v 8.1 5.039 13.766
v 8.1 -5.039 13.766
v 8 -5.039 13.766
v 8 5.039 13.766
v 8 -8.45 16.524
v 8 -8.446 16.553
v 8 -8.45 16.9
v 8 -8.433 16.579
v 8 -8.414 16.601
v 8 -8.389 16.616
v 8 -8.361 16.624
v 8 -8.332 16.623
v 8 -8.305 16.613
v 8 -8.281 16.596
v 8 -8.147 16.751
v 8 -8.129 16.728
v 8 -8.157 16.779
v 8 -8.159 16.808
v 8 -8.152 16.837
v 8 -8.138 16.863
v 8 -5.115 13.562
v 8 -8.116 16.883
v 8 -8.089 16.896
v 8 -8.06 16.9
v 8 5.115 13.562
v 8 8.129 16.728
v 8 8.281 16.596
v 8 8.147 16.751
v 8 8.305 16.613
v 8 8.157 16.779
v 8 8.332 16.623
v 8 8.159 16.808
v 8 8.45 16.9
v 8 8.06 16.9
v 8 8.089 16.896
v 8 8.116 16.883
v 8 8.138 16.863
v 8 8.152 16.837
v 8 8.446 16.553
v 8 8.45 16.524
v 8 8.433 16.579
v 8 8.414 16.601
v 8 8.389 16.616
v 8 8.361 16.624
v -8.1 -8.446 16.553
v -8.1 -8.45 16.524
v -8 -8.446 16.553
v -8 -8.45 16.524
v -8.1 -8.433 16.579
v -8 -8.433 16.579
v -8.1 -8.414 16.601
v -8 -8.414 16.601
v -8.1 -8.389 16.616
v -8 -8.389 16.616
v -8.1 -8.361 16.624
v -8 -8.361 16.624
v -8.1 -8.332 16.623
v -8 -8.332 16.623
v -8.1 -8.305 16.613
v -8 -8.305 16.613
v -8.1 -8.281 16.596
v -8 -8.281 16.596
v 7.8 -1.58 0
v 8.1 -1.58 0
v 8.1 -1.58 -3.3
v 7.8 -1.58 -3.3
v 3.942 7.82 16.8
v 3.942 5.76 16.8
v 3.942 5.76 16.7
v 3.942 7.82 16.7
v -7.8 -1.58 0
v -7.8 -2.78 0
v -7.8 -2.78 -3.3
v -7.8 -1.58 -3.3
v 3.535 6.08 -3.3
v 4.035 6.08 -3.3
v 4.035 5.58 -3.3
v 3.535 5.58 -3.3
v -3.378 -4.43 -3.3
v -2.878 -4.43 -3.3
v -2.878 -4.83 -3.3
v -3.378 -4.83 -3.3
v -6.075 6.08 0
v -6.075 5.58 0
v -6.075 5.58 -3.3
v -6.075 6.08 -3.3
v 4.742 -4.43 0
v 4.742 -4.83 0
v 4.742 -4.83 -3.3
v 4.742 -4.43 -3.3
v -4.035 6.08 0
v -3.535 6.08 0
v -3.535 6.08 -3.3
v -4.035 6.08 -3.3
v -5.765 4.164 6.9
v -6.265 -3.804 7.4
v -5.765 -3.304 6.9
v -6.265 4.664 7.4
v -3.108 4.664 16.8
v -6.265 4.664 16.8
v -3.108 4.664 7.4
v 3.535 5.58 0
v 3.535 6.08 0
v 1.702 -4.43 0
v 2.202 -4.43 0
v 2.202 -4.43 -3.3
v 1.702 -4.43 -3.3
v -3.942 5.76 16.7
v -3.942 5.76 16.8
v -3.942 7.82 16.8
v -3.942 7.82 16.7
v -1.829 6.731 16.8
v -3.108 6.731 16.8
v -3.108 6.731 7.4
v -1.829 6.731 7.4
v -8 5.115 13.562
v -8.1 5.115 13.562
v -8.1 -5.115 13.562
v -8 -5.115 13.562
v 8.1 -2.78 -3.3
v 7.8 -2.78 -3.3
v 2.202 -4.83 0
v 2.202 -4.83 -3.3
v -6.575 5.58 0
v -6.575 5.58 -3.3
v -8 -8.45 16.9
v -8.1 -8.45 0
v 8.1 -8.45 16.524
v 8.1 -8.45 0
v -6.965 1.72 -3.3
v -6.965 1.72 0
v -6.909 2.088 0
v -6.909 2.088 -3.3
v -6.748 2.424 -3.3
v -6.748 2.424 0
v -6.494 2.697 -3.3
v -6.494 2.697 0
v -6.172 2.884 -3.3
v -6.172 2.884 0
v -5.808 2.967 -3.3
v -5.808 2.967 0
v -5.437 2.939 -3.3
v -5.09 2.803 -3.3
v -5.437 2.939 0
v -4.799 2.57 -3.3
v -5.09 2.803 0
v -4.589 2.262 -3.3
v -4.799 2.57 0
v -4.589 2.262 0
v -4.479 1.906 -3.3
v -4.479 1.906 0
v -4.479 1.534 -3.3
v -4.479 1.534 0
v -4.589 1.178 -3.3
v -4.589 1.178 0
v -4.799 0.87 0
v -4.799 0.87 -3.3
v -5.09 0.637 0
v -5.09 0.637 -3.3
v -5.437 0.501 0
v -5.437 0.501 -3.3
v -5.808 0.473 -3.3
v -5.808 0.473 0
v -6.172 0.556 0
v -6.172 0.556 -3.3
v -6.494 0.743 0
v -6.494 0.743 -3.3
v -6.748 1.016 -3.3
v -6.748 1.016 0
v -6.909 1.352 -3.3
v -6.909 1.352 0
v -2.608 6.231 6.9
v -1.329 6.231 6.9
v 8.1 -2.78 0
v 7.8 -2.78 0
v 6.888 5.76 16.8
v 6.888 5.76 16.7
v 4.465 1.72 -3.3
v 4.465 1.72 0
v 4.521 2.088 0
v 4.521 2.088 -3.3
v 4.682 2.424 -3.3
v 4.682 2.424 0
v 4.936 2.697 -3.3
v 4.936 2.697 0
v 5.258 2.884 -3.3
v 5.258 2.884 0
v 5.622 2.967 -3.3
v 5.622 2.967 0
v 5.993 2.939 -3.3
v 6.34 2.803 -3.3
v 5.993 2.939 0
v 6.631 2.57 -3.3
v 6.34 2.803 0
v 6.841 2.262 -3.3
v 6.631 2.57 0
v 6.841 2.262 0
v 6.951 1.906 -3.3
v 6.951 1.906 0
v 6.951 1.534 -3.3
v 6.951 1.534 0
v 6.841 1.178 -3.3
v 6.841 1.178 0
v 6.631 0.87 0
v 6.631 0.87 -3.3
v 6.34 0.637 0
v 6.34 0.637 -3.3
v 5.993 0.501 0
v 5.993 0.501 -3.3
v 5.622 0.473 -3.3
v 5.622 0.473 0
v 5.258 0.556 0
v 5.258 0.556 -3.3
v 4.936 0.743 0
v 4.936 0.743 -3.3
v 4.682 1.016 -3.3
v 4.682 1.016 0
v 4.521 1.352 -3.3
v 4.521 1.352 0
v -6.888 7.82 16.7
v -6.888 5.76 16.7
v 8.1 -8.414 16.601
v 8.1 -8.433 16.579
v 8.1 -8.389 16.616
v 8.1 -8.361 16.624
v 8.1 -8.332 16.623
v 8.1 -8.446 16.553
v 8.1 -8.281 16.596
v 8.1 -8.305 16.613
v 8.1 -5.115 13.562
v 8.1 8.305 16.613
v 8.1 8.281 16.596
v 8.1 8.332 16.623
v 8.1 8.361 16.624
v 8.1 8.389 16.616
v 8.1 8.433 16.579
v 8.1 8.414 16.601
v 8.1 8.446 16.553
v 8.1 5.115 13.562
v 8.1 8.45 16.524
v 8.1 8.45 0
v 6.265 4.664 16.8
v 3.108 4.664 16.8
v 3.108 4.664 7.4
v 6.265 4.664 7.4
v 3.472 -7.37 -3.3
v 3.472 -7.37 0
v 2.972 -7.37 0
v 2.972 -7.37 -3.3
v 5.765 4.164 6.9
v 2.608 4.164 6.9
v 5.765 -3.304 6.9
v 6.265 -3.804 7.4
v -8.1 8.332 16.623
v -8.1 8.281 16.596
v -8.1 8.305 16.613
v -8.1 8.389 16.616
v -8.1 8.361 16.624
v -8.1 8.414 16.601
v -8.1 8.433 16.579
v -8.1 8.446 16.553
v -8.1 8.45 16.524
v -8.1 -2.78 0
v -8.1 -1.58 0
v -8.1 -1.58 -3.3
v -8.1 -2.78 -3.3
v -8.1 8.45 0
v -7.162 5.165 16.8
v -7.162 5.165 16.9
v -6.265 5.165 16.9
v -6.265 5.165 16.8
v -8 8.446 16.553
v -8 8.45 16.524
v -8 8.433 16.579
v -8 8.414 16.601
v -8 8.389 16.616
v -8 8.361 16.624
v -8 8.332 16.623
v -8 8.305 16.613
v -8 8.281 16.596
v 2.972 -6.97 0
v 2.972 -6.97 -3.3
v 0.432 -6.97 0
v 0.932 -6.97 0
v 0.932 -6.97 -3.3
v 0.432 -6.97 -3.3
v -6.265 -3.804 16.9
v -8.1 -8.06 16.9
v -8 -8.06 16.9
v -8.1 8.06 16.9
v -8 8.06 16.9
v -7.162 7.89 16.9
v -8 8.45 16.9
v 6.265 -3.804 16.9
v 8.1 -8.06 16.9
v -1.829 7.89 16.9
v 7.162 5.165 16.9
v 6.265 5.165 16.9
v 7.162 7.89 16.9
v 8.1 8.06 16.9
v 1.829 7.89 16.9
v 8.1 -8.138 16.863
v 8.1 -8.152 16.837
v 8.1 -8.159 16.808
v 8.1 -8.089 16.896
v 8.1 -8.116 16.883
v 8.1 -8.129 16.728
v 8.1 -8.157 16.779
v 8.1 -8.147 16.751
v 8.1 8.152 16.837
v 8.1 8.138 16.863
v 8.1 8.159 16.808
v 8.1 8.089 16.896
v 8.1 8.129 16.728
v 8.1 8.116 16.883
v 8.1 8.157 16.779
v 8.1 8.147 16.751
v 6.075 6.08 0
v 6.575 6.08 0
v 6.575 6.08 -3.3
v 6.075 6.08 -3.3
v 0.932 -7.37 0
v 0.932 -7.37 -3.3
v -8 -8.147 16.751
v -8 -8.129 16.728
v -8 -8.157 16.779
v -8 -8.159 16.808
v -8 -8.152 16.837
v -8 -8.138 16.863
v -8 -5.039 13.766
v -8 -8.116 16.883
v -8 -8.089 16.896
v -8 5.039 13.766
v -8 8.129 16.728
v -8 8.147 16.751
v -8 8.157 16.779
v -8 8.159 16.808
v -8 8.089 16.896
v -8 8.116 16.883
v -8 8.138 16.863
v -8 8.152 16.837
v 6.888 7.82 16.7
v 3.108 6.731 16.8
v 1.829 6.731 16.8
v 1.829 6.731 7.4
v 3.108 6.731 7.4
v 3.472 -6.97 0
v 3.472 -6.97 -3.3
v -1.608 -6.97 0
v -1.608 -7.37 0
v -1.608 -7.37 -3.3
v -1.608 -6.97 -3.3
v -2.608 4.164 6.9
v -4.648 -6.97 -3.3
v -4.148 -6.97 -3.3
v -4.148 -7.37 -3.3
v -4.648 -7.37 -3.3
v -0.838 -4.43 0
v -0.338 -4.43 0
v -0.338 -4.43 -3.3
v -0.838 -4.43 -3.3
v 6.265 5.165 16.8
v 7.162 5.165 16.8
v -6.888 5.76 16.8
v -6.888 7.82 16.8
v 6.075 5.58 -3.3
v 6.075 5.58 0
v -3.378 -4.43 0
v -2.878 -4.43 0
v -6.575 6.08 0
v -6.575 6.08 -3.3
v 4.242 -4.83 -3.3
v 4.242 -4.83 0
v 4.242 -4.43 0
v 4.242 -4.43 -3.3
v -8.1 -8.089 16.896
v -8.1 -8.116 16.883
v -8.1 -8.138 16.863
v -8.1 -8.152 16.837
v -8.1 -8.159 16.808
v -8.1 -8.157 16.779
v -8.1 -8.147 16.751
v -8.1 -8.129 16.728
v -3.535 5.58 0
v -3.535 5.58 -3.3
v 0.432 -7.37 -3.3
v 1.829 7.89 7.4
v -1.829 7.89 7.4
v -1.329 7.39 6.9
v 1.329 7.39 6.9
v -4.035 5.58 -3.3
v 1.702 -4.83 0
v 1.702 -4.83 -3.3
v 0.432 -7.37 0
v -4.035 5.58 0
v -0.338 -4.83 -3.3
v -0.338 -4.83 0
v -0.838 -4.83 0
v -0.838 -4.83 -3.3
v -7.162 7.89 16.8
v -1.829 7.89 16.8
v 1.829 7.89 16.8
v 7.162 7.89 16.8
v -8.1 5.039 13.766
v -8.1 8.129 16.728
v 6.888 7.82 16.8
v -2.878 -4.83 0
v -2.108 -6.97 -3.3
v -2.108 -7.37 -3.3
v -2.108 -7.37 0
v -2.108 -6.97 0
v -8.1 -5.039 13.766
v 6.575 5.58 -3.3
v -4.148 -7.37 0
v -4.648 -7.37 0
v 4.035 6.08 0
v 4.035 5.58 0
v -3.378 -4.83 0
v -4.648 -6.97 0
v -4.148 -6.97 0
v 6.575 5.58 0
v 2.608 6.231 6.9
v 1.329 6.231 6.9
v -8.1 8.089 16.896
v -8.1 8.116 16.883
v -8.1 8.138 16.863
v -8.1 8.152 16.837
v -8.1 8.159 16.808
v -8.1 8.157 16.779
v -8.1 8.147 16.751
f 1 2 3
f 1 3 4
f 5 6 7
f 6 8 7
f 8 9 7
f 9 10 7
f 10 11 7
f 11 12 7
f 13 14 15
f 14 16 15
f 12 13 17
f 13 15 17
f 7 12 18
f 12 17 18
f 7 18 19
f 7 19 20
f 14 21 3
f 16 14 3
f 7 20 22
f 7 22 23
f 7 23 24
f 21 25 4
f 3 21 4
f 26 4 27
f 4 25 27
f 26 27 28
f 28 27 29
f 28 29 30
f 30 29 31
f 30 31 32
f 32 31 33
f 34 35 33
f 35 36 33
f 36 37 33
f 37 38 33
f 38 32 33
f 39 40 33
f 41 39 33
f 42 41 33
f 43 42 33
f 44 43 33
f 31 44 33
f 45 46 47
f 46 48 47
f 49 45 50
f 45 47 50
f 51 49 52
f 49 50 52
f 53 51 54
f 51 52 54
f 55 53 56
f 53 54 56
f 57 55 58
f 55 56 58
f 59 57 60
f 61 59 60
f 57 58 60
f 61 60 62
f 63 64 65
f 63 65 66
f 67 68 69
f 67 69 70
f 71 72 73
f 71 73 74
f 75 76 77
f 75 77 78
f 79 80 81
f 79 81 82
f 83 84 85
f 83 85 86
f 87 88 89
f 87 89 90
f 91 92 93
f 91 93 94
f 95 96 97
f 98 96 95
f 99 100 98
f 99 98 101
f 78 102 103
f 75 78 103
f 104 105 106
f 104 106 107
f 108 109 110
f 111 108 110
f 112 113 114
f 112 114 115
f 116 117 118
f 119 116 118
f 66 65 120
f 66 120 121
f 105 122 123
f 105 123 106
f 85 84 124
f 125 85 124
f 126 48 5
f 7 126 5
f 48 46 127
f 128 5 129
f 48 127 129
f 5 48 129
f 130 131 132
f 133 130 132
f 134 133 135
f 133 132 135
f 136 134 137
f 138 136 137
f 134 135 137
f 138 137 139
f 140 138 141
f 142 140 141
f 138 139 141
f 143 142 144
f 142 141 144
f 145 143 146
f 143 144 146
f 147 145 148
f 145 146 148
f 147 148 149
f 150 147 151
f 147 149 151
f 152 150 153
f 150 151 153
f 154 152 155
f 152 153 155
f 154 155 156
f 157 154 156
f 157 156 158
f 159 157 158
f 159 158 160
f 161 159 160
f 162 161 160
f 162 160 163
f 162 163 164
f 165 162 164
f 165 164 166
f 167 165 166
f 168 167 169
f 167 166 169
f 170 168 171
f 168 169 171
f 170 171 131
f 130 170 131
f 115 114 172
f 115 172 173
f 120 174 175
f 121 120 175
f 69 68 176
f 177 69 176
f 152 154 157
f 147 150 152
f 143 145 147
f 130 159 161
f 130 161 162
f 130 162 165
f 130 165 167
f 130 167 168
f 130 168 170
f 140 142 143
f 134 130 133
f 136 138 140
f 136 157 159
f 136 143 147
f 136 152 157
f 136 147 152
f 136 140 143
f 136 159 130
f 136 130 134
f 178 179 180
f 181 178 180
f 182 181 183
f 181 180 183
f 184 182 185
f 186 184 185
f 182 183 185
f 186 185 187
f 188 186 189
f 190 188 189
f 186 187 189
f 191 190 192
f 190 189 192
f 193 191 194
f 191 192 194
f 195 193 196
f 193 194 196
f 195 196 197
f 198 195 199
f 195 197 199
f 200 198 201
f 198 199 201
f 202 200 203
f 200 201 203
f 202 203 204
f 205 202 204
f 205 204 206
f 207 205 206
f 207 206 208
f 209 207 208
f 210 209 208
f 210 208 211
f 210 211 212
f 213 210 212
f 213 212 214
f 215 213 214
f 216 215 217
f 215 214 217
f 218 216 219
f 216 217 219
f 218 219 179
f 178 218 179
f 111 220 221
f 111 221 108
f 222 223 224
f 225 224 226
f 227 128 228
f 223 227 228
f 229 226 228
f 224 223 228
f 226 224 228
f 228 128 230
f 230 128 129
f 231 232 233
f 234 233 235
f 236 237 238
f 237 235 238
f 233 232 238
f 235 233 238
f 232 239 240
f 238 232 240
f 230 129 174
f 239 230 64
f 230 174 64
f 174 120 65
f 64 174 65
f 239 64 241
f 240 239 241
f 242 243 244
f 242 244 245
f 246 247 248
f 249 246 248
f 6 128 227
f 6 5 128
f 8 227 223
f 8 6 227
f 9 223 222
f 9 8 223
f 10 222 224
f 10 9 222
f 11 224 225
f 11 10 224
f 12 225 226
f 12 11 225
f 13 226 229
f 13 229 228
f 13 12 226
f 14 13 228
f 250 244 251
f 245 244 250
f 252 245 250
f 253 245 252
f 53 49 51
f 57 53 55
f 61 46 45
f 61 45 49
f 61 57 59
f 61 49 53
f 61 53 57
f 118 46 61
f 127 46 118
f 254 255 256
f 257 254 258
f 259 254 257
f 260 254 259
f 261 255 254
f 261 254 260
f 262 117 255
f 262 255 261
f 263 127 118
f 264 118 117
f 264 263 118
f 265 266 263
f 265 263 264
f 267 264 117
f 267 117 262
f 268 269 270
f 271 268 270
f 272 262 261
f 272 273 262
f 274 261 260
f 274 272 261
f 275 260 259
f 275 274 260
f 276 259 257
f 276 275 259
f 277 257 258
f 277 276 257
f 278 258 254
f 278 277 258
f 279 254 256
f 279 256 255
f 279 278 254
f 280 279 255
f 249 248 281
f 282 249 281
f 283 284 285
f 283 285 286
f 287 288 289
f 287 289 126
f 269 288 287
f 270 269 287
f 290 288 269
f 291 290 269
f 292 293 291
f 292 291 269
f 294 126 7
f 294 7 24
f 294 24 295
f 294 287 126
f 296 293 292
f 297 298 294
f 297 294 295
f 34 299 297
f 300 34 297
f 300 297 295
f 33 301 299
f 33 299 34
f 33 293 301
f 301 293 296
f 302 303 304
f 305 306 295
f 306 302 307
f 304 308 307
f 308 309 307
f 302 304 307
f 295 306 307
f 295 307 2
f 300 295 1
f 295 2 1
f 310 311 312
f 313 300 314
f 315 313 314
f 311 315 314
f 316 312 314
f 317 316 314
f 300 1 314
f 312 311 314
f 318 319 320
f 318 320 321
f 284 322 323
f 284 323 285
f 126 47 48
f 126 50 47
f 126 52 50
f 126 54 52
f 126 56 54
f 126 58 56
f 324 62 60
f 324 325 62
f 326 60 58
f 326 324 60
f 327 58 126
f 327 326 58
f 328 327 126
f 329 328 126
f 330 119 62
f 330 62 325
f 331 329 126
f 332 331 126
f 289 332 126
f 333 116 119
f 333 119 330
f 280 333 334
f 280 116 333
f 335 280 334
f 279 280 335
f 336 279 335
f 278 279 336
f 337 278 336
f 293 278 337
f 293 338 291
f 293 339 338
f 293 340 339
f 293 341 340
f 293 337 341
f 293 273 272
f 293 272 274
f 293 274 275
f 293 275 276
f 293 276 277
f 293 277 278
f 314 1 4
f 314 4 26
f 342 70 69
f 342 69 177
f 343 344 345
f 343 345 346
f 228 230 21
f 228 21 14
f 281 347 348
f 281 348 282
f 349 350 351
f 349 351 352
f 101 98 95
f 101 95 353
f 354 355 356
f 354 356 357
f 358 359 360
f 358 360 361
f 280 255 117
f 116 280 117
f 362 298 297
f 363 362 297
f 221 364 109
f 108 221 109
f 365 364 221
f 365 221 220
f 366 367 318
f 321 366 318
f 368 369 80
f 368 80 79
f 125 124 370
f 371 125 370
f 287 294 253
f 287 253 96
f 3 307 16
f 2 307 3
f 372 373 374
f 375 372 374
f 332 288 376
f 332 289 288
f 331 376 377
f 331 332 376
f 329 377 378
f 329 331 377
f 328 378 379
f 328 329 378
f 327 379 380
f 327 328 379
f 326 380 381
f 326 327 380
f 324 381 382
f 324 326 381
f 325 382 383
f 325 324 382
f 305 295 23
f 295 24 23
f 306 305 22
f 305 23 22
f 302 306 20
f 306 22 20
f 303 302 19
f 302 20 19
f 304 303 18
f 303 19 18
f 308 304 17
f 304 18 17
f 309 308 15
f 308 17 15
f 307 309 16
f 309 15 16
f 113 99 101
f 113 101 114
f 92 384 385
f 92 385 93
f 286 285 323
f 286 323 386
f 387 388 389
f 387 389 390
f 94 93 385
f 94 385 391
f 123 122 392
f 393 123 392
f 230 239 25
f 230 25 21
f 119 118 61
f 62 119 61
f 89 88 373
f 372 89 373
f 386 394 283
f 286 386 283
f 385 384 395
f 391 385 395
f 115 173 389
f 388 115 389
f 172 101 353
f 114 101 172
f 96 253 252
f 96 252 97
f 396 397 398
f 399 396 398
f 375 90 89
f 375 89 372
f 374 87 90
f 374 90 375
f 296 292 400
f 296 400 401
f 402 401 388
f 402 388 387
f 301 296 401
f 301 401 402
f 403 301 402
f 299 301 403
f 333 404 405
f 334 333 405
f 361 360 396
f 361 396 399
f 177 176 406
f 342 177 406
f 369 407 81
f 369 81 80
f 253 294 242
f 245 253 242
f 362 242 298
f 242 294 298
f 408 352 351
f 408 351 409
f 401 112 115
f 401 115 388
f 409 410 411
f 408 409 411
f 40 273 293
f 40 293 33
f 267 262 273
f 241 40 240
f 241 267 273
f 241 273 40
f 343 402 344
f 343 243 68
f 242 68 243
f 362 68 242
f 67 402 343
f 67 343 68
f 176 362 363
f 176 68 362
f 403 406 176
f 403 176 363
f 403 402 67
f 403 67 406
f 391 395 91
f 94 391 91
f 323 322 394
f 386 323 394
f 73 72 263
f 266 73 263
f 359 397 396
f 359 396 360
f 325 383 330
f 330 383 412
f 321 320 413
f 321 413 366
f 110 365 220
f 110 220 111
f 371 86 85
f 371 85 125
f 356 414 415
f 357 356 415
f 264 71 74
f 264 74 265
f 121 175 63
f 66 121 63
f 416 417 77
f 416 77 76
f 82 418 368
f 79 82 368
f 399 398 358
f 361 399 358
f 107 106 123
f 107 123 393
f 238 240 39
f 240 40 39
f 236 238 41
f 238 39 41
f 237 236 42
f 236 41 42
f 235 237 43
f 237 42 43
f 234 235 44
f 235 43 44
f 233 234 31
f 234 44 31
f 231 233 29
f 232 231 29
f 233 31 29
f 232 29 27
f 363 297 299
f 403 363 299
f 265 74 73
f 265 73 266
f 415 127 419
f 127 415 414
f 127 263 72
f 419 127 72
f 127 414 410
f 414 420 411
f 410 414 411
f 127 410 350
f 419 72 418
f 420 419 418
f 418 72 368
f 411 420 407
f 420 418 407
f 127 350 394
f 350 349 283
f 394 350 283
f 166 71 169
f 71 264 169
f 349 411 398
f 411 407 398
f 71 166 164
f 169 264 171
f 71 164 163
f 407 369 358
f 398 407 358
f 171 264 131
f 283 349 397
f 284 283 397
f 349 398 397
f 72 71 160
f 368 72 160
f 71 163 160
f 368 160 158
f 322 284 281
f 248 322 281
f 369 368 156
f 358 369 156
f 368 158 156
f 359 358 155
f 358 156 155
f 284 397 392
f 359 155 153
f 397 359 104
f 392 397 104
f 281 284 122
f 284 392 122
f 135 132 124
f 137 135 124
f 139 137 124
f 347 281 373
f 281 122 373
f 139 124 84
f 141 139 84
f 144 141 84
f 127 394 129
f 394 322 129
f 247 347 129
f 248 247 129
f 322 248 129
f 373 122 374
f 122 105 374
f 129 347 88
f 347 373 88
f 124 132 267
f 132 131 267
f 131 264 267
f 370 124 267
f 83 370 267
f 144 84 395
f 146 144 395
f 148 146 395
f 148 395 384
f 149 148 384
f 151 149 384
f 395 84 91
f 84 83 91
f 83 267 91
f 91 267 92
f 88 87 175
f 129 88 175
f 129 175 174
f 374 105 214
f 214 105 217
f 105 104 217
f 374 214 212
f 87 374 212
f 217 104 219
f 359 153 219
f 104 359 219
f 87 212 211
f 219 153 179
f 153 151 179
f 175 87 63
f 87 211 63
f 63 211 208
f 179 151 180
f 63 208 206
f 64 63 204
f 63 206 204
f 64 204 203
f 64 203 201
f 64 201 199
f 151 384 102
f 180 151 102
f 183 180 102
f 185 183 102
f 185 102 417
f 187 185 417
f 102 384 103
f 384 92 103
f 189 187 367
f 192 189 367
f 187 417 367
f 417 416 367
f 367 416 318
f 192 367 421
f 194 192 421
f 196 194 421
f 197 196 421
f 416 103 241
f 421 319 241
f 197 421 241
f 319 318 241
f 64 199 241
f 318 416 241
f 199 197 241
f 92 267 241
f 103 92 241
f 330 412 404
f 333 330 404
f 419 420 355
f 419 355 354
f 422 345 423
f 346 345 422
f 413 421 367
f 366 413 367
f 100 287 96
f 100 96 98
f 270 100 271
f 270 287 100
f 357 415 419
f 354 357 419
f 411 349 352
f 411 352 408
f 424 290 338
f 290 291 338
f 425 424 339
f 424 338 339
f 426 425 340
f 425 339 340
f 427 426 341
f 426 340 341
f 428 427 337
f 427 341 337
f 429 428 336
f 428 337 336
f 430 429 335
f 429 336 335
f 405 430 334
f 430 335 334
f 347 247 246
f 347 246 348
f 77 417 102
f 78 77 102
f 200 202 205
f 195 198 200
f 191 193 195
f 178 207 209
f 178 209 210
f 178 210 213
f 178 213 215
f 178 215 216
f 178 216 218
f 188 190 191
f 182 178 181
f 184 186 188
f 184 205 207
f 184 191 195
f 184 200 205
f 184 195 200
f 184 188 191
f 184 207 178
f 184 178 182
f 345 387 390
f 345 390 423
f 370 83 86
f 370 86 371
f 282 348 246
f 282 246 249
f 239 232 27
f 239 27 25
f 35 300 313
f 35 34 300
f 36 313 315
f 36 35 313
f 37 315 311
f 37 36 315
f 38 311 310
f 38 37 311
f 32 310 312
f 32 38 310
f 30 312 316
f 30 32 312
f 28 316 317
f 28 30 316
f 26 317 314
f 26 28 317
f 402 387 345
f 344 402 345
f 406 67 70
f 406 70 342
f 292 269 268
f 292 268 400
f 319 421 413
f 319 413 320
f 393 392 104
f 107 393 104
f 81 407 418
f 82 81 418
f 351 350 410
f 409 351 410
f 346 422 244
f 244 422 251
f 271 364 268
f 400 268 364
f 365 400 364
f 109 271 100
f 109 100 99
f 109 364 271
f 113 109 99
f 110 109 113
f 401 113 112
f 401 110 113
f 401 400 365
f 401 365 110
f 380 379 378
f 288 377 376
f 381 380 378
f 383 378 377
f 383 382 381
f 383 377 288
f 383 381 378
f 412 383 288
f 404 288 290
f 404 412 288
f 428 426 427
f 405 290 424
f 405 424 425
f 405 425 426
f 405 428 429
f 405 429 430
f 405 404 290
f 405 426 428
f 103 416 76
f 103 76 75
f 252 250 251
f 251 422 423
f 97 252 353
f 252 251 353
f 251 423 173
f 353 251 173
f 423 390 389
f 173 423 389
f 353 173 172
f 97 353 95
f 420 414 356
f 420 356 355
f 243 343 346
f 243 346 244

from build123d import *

# Parameters (mm, degrees)
SKETCH_1_W          = 16.2
SKETCH_1_H          = 16.9
EXTRUDE_1_DEPTH     = 16.9
CUT_EXTRUDE_1_DEPTH = 10
SKETCH_3_W          = 2.946300562
SKETCH_3_H          = 2.060350043
CUT_EXTRUDE_2_DEPTH = 0.2
SKETCH_4_W          = 14.323300114
SKETCH_4_H          = 2.725353119
CUT_EXTRUDE_3_DEPTH = 0.1
SKETCH_5_W          = 12.529891582
SKETCH_5_H          = 0.500524342
CUT_EXTRUDE_4_DEPTH = 0.1
CHAMFER_1_SIZE      = 0.5
CUT_EXTRUDE_5_DEPTH = 0.1
FILLET_1_R          = 0.1
SKETCH_7_R          = 1.25
SKETCH_7_W          = 0.5
SKETCH_7_H          = 0.4
SKETCH_7_H_2        = 0.5
SKETCH_7_W_2        = 0.3
SKETCH_7_H_3        = 1.2
EXTRUDE_2_DEPTH     = 3.3


with BuildPart() as part:
    # Эскиз1 → Бобышка-Вытянуть1 (new body)
    with BuildSketch(Plane.XY):
        Rectangle(SKETCH_1_W, SKETCH_1_H)
    extrude(amount=EXTRUDE_1_DEPTH)

    # Эскиз2 → Вырез-Вытянуть1 (cut)
    with BuildSketch(Plane.XY.offset(16.9)):
        Polygon((-6.264945791, -3.803921673), (-6.264945791, 4.664369649), (-3.10783524, 4.664369649), (-3.10783524, 6.730894781), (-1.828998264, 6.730894781), (-1.828998264, 7.89024711), (1.828998264, 7.89024711), (1.828998264, 6.730894781), (3.10783524, 6.730894781), (3.10783524, 4.664369649), (6.264945791, 4.664369649), (6.264945791, -3.803921673), align=None)
    extrude(amount=-CUT_EXTRUDE_1_DEPTH, mode=Mode.SUBTRACT)

    # Эскиз3 → Вырез-Вытянуть2 (cut)
    with BuildSketch(Plane.XY.offset(16.9)):
        with Locations((-5.415203287, 6.790232272)):
            Rectangle(SKETCH_3_W, SKETCH_3_H)
        with Locations((5.415203287, 6.790232272)):
            Rectangle(SKETCH_3_W, SKETCH_3_H)
    extrude(amount=-CUT_EXTRUDE_2_DEPTH, mode=Mode.SUBTRACT)

    # Эскиз4 → Вырез-Вытянуть3 (cut)
    with BuildSketch(Plane.XY.offset(16.9)):
        with Locations((0, 6.527570551)):
            Rectangle(SKETCH_4_W, SKETCH_4_H)
    extrude(amount=-CUT_EXTRUDE_3_DEPTH, mode=Mode.SUBTRACT)

    # Эскиз5 → Вырез-Вытянуть4 (cut)
    with BuildSketch(Plane.XY.offset(16.9)):
        with Locations((0, 4.91463182)):
            Rectangle(SKETCH_5_W, SKETCH_5_H)
    extrude(amount=-CUT_EXTRUDE_4_DEPTH, mode=Mode.SUBTRACT)

    # Фаска1
    chamfer_1_edges = [part.edges().sort_by_distance(p)[0] for p in [
        (0, -3.803921673, 6.9),
        (-6.264945791, 0.430223988, 6.9),
        (-4.686390516, 4.664369649, 6.9),
        (-3.10783524, 5.697632215, 6.9),
        (-2.468416752, 6.730894781, 6.9),
        (-1.828998264, 7.310570945, 6.9),
        (0, 7.89024711, 6.9),
        (1.828998264, 7.310570945, 6.9),
        (2.468416752, 6.730894781, 6.9),
        (3.10783524, 5.697632215, 6.9),
        (4.686390516, 4.664369649, 6.9),
        (6.264945791, 0.430223988, 6.9),
    ]]
    chamfer(chamfer_1_edges, length=CHAMFER_1_SIZE)

    # Эскиз6 → Вырез-Вытянуть5 (cut)
    with BuildSketch(Plane.ZY.offset(8.1)):
        Polygon((16.758546947, 8.45), (13.561955432, 5.115115471), (13.561955432, -5.115115471), (16.758546947, -8.45), (16.9, -8.45), (16.9, -8.308546947), (13.766132229, -5.039099757), (13.766132229, 5.039099757), (16.9, 8.308546947), (16.9, 8.45), align=None)
    cut_extrude_5 = extrude(amount=-CUT_EXTRUDE_5_DEPTH, mode=Mode.SUBTRACT)

    # Зеркальное отражение1: Вырез-Вытянуть5 across plane
    add(cut_extrude_5.mirror(Plane(origin=(0, 0, 0), x_dir=(0, 0, 1), z_dir=(1, 0, 0))), mode=Mode.SUBTRACT)

    # Скругление1
    fillet_1_edges = [part.edges().sort_by_distance(p)[0] for p in [
        (-8.05, 8.45, 16.758546947),
        (-8.05, 8.308546947, 16.9),
        (-8.05, -8.308546947, 16.9),
        (-8.05, -8.45, 16.758546947),
        (8.05, 8.45, 16.758546947),
        (8.05, -8.45, 16.758546947),
        (8.05, -8.308546947, 16.9),
        (8.05, 8.308546947, 16.9),
    ]]
    fillet(fillet_1_edges, radius=FILLET_1_R)

    # Эскиз7 → Бобышка-Вытянуть2 (add)
    with BuildSketch(Plane(origin=(0, 0, 0), x_dir=(-1, 0, 0), z_dir=(0, 0, -1))):
        with Locations((-5.715, 1.72)):
            Circle(SKETCH_7_R)
        with Locations((5.715, 1.72)):
            Circle(SKETCH_7_R)
        with Locations((-4.492372984, -4.63)):
            Rectangle(SKETCH_7_W, SKETCH_7_H)
        with Locations((-3.222372984, -7.17)):
            Rectangle(SKETCH_7_W, SKETCH_7_H)
        with Locations((-1.952372984, -4.63)):
            Rectangle(SKETCH_7_W, SKETCH_7_H)
        with Locations((-0.682372984, -7.17)):
            Rectangle(SKETCH_7_W, SKETCH_7_H)
        with Locations((0.587627016, -4.63)):
            Rectangle(SKETCH_7_W, SKETCH_7_H)
        with Locations((1.857627016, -7.17)):
            Rectangle(SKETCH_7_W, SKETCH_7_H)
        with Locations((3.127627016, -4.63)):
            Rectangle(SKETCH_7_W, SKETCH_7_H)
        with Locations((4.397627016, -7.17)):
            Rectangle(SKETCH_7_W, SKETCH_7_H)
        with Locations((-6.325, 5.83)):
            Rectangle(SKETCH_7_W, SKETCH_7_H_2)
        with Locations((-3.785, 5.83)):
            Rectangle(SKETCH_7_W, SKETCH_7_H_2)
        with Locations((3.785, 5.83)):
            Rectangle(SKETCH_7_W, SKETCH_7_H_2)
        with Locations((6.325, 5.83)):
            Rectangle(SKETCH_7_W, SKETCH_7_H_2)
        with Locations((-7.95, -2.18)):
            Rectangle(SKETCH_7_W_2, SKETCH_7_H_3)
        with Locations((7.95, -2.18)):
            Rectangle(SKETCH_7_W_2, SKETCH_7_H_3)
    extrude(amount=EXTRUDE_2_DEPTH)


solid = part.part
